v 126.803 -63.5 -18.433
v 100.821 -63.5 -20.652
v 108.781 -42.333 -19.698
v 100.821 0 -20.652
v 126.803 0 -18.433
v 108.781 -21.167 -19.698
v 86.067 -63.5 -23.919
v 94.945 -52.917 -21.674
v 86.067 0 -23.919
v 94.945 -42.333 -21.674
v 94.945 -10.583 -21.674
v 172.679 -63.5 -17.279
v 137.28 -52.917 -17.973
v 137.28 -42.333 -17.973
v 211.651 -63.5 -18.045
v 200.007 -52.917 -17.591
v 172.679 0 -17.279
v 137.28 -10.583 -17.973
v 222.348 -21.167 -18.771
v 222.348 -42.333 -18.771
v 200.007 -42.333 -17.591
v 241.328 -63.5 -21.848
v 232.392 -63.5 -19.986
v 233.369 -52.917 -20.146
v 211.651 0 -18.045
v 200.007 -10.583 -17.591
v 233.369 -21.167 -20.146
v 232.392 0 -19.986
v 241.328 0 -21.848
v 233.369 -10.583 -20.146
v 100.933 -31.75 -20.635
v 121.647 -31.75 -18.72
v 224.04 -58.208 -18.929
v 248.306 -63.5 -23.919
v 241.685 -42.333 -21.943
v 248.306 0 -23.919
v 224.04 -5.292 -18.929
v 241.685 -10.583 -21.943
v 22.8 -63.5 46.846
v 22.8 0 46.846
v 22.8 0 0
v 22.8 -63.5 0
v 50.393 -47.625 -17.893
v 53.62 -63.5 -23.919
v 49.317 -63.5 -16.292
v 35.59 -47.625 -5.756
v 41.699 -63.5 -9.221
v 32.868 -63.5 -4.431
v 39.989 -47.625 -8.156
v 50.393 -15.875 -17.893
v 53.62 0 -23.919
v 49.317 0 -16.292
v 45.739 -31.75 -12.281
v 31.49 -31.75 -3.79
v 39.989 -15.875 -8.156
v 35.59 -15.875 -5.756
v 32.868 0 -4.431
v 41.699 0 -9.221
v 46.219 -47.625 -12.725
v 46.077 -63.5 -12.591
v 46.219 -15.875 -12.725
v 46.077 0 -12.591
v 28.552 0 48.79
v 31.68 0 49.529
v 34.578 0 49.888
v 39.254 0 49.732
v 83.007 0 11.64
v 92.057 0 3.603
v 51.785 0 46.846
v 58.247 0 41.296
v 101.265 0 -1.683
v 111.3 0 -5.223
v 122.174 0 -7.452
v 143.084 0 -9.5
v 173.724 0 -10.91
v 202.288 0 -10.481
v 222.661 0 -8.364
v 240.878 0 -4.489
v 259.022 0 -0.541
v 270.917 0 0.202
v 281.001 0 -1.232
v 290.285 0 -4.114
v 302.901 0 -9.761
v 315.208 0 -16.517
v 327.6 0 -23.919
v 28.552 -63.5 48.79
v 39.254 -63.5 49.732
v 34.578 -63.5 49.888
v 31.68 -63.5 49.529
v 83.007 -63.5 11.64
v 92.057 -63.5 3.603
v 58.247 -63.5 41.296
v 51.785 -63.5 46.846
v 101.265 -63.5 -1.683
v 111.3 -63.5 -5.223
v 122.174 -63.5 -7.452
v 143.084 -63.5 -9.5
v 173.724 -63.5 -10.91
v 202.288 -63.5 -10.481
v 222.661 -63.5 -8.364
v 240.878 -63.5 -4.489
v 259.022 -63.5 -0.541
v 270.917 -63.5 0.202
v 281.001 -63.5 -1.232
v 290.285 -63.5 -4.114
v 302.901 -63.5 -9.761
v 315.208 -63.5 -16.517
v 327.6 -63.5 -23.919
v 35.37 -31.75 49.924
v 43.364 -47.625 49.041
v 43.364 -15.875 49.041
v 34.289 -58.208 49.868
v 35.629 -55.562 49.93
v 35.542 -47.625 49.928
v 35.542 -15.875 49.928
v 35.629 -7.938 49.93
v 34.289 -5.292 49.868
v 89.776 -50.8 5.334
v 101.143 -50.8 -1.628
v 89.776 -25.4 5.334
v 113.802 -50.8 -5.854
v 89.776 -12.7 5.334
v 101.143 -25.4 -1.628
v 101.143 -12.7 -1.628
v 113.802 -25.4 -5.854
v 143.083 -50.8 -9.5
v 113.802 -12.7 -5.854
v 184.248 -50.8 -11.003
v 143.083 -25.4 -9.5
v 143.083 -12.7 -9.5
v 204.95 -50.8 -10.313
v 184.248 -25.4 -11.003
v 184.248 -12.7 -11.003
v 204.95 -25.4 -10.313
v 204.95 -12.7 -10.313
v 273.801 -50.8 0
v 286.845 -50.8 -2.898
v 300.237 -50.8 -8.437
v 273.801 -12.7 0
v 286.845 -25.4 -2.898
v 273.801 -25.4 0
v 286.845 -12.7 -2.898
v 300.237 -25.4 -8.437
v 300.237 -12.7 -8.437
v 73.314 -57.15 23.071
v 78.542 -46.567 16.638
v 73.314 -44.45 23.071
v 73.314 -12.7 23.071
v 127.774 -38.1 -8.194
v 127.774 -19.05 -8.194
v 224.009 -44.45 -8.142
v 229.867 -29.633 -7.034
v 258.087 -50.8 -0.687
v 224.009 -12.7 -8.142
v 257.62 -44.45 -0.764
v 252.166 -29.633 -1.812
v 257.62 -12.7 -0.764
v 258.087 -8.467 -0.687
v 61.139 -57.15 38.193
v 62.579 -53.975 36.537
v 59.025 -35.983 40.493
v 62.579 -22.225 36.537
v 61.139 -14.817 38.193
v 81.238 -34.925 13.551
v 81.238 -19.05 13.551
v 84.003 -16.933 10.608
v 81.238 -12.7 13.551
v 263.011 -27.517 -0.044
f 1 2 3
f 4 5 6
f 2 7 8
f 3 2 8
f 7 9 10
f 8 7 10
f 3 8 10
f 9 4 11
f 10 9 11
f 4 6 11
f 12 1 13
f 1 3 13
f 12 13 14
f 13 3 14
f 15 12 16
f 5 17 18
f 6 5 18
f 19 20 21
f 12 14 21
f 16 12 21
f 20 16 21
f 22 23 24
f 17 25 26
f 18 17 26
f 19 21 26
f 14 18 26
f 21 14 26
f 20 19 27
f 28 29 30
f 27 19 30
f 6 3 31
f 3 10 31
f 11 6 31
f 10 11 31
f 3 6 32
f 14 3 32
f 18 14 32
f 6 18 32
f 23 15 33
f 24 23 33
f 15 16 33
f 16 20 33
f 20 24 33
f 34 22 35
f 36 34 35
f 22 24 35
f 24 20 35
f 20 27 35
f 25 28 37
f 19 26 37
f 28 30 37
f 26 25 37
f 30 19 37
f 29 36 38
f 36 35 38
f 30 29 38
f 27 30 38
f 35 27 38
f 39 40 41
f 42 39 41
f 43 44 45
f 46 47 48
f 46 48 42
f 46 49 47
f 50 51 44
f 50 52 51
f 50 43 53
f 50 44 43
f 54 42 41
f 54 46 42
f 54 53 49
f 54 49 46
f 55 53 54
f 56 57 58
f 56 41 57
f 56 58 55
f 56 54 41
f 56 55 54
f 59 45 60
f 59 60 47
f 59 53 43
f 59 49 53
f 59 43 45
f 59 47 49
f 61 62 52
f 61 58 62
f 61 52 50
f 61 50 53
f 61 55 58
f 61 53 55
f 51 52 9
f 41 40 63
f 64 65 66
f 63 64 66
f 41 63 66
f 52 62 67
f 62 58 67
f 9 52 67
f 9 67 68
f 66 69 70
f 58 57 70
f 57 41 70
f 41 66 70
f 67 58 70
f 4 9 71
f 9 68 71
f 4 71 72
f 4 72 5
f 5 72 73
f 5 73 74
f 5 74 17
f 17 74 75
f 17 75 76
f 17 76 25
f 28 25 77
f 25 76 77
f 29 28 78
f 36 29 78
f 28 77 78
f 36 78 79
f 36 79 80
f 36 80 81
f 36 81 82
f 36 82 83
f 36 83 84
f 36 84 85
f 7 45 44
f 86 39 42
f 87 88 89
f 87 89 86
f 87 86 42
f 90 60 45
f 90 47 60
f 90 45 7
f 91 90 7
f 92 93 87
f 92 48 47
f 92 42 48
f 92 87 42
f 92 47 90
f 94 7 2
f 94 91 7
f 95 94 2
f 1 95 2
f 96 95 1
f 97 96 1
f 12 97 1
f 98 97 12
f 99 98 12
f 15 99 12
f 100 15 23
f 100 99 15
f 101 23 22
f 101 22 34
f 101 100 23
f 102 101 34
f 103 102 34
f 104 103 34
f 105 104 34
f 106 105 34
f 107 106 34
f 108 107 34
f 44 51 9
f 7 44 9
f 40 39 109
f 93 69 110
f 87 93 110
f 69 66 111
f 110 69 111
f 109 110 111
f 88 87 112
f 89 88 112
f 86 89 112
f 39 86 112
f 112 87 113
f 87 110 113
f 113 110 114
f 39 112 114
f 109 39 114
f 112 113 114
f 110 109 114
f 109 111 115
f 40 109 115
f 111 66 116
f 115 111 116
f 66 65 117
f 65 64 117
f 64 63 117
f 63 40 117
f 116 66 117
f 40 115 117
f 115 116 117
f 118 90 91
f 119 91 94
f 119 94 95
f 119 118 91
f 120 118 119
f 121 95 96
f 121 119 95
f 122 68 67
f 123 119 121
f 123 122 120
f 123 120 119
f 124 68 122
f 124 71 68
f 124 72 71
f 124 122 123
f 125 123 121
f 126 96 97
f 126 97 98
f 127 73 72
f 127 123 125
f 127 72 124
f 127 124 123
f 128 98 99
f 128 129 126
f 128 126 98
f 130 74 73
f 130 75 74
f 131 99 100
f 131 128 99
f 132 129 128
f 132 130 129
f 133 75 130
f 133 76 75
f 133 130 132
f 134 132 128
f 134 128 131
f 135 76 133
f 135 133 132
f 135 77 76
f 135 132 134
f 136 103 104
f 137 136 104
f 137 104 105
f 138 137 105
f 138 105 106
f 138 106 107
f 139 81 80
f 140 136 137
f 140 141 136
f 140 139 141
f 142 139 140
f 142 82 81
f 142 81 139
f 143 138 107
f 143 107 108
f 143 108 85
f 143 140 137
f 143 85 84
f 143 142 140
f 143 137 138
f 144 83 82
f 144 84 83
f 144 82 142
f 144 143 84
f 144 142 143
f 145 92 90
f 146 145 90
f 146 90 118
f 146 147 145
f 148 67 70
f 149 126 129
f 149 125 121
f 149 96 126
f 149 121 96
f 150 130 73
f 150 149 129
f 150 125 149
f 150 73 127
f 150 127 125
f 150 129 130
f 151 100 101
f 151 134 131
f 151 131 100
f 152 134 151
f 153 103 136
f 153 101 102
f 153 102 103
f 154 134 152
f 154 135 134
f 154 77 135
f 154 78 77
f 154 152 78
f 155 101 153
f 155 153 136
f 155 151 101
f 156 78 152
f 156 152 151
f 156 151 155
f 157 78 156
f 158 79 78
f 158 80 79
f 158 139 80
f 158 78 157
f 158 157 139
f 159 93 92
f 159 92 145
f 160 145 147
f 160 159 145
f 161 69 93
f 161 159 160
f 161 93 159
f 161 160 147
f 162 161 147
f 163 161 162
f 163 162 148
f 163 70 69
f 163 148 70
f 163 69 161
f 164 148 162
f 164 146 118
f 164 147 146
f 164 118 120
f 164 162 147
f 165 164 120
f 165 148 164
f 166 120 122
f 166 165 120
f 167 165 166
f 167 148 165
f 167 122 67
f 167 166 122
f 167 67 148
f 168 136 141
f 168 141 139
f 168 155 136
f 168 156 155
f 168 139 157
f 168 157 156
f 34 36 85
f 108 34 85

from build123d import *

# Parameters (mm, degrees)
F1_DEPTH = 63.5


with BuildPart() as f1:
    # F0 (on Front) → F1 (new body)
    with BuildSketch(Plane.XZ):
        with BuildLine():
            Line((248.3064383268, -23.9190738648), (327.6000506759, -23.9190738648))
            add(Edge.make_bspline(
                [(51.784705917, 46.8463032775), (64.3627199206, 38.2224960157), (86.242739761, -4.2142122955), (143.1899818673, -10.3956088976), (224.5018800017, -13.0365552228), (273.9602481654, 8.5484646767), (309.2548083769, -12.8149155063), (327.6000506759, -23.9190738648)],
                knots=[0.1230272713, 0.1230272713, 0.1230272713, 0.1230272713, 0.2929748368, 0.4614964871, 0.6655576891, 0.8261651316, 1, 1, 1, 1], degree=3))
            add(Edge.make_bspline(
                [(51.784705917, 46.8463032775), (46.1238504985, 48.4549538308), (35.4798819977, 51.4796602669), (26.8433541555, 48.323773124), (22.8000506759, 46.8463032775)],
                knots=[0, 0, 0, 0, 0.5318369195, 1, 1, 1, 1], degree=3))
            Line((22.8000506759, 46.8463032775), (22.8000506759, 0))
            add(Edge.make_bspline(
                [(53.6195226014, -23.9190738648), (51.6267524286, -19.8552994072), (46.9225734911, -10.2622602941), (31.6201229906, -3.752255873), (22.8000506759, 0)],
                knots=[0, 0, 0, 0, 0.4236170008, 1, 1, 1, 1], degree=3))
            Line((53.6195226014, -23.9190738648), (86.0673412681, -23.9190738648))
            add(Edge.make_bspline(
                [(86.0673412681, -23.9190738648), (91.4344469398, -22.3923479457), (108.7015088288, -17.4805626102), (222.9189133429, -15.8832854518), (242.0711760107, -21.9454569524), (248.3064383268, -23.9190738648)],
                knots=[0, 0, 0, 0, 0.2332370271, 0.7503705775, 1, 1, 1, 1], degree=3))
        make_face()
    extrude(amount=F1_DEPTH)


solid = f1.part
